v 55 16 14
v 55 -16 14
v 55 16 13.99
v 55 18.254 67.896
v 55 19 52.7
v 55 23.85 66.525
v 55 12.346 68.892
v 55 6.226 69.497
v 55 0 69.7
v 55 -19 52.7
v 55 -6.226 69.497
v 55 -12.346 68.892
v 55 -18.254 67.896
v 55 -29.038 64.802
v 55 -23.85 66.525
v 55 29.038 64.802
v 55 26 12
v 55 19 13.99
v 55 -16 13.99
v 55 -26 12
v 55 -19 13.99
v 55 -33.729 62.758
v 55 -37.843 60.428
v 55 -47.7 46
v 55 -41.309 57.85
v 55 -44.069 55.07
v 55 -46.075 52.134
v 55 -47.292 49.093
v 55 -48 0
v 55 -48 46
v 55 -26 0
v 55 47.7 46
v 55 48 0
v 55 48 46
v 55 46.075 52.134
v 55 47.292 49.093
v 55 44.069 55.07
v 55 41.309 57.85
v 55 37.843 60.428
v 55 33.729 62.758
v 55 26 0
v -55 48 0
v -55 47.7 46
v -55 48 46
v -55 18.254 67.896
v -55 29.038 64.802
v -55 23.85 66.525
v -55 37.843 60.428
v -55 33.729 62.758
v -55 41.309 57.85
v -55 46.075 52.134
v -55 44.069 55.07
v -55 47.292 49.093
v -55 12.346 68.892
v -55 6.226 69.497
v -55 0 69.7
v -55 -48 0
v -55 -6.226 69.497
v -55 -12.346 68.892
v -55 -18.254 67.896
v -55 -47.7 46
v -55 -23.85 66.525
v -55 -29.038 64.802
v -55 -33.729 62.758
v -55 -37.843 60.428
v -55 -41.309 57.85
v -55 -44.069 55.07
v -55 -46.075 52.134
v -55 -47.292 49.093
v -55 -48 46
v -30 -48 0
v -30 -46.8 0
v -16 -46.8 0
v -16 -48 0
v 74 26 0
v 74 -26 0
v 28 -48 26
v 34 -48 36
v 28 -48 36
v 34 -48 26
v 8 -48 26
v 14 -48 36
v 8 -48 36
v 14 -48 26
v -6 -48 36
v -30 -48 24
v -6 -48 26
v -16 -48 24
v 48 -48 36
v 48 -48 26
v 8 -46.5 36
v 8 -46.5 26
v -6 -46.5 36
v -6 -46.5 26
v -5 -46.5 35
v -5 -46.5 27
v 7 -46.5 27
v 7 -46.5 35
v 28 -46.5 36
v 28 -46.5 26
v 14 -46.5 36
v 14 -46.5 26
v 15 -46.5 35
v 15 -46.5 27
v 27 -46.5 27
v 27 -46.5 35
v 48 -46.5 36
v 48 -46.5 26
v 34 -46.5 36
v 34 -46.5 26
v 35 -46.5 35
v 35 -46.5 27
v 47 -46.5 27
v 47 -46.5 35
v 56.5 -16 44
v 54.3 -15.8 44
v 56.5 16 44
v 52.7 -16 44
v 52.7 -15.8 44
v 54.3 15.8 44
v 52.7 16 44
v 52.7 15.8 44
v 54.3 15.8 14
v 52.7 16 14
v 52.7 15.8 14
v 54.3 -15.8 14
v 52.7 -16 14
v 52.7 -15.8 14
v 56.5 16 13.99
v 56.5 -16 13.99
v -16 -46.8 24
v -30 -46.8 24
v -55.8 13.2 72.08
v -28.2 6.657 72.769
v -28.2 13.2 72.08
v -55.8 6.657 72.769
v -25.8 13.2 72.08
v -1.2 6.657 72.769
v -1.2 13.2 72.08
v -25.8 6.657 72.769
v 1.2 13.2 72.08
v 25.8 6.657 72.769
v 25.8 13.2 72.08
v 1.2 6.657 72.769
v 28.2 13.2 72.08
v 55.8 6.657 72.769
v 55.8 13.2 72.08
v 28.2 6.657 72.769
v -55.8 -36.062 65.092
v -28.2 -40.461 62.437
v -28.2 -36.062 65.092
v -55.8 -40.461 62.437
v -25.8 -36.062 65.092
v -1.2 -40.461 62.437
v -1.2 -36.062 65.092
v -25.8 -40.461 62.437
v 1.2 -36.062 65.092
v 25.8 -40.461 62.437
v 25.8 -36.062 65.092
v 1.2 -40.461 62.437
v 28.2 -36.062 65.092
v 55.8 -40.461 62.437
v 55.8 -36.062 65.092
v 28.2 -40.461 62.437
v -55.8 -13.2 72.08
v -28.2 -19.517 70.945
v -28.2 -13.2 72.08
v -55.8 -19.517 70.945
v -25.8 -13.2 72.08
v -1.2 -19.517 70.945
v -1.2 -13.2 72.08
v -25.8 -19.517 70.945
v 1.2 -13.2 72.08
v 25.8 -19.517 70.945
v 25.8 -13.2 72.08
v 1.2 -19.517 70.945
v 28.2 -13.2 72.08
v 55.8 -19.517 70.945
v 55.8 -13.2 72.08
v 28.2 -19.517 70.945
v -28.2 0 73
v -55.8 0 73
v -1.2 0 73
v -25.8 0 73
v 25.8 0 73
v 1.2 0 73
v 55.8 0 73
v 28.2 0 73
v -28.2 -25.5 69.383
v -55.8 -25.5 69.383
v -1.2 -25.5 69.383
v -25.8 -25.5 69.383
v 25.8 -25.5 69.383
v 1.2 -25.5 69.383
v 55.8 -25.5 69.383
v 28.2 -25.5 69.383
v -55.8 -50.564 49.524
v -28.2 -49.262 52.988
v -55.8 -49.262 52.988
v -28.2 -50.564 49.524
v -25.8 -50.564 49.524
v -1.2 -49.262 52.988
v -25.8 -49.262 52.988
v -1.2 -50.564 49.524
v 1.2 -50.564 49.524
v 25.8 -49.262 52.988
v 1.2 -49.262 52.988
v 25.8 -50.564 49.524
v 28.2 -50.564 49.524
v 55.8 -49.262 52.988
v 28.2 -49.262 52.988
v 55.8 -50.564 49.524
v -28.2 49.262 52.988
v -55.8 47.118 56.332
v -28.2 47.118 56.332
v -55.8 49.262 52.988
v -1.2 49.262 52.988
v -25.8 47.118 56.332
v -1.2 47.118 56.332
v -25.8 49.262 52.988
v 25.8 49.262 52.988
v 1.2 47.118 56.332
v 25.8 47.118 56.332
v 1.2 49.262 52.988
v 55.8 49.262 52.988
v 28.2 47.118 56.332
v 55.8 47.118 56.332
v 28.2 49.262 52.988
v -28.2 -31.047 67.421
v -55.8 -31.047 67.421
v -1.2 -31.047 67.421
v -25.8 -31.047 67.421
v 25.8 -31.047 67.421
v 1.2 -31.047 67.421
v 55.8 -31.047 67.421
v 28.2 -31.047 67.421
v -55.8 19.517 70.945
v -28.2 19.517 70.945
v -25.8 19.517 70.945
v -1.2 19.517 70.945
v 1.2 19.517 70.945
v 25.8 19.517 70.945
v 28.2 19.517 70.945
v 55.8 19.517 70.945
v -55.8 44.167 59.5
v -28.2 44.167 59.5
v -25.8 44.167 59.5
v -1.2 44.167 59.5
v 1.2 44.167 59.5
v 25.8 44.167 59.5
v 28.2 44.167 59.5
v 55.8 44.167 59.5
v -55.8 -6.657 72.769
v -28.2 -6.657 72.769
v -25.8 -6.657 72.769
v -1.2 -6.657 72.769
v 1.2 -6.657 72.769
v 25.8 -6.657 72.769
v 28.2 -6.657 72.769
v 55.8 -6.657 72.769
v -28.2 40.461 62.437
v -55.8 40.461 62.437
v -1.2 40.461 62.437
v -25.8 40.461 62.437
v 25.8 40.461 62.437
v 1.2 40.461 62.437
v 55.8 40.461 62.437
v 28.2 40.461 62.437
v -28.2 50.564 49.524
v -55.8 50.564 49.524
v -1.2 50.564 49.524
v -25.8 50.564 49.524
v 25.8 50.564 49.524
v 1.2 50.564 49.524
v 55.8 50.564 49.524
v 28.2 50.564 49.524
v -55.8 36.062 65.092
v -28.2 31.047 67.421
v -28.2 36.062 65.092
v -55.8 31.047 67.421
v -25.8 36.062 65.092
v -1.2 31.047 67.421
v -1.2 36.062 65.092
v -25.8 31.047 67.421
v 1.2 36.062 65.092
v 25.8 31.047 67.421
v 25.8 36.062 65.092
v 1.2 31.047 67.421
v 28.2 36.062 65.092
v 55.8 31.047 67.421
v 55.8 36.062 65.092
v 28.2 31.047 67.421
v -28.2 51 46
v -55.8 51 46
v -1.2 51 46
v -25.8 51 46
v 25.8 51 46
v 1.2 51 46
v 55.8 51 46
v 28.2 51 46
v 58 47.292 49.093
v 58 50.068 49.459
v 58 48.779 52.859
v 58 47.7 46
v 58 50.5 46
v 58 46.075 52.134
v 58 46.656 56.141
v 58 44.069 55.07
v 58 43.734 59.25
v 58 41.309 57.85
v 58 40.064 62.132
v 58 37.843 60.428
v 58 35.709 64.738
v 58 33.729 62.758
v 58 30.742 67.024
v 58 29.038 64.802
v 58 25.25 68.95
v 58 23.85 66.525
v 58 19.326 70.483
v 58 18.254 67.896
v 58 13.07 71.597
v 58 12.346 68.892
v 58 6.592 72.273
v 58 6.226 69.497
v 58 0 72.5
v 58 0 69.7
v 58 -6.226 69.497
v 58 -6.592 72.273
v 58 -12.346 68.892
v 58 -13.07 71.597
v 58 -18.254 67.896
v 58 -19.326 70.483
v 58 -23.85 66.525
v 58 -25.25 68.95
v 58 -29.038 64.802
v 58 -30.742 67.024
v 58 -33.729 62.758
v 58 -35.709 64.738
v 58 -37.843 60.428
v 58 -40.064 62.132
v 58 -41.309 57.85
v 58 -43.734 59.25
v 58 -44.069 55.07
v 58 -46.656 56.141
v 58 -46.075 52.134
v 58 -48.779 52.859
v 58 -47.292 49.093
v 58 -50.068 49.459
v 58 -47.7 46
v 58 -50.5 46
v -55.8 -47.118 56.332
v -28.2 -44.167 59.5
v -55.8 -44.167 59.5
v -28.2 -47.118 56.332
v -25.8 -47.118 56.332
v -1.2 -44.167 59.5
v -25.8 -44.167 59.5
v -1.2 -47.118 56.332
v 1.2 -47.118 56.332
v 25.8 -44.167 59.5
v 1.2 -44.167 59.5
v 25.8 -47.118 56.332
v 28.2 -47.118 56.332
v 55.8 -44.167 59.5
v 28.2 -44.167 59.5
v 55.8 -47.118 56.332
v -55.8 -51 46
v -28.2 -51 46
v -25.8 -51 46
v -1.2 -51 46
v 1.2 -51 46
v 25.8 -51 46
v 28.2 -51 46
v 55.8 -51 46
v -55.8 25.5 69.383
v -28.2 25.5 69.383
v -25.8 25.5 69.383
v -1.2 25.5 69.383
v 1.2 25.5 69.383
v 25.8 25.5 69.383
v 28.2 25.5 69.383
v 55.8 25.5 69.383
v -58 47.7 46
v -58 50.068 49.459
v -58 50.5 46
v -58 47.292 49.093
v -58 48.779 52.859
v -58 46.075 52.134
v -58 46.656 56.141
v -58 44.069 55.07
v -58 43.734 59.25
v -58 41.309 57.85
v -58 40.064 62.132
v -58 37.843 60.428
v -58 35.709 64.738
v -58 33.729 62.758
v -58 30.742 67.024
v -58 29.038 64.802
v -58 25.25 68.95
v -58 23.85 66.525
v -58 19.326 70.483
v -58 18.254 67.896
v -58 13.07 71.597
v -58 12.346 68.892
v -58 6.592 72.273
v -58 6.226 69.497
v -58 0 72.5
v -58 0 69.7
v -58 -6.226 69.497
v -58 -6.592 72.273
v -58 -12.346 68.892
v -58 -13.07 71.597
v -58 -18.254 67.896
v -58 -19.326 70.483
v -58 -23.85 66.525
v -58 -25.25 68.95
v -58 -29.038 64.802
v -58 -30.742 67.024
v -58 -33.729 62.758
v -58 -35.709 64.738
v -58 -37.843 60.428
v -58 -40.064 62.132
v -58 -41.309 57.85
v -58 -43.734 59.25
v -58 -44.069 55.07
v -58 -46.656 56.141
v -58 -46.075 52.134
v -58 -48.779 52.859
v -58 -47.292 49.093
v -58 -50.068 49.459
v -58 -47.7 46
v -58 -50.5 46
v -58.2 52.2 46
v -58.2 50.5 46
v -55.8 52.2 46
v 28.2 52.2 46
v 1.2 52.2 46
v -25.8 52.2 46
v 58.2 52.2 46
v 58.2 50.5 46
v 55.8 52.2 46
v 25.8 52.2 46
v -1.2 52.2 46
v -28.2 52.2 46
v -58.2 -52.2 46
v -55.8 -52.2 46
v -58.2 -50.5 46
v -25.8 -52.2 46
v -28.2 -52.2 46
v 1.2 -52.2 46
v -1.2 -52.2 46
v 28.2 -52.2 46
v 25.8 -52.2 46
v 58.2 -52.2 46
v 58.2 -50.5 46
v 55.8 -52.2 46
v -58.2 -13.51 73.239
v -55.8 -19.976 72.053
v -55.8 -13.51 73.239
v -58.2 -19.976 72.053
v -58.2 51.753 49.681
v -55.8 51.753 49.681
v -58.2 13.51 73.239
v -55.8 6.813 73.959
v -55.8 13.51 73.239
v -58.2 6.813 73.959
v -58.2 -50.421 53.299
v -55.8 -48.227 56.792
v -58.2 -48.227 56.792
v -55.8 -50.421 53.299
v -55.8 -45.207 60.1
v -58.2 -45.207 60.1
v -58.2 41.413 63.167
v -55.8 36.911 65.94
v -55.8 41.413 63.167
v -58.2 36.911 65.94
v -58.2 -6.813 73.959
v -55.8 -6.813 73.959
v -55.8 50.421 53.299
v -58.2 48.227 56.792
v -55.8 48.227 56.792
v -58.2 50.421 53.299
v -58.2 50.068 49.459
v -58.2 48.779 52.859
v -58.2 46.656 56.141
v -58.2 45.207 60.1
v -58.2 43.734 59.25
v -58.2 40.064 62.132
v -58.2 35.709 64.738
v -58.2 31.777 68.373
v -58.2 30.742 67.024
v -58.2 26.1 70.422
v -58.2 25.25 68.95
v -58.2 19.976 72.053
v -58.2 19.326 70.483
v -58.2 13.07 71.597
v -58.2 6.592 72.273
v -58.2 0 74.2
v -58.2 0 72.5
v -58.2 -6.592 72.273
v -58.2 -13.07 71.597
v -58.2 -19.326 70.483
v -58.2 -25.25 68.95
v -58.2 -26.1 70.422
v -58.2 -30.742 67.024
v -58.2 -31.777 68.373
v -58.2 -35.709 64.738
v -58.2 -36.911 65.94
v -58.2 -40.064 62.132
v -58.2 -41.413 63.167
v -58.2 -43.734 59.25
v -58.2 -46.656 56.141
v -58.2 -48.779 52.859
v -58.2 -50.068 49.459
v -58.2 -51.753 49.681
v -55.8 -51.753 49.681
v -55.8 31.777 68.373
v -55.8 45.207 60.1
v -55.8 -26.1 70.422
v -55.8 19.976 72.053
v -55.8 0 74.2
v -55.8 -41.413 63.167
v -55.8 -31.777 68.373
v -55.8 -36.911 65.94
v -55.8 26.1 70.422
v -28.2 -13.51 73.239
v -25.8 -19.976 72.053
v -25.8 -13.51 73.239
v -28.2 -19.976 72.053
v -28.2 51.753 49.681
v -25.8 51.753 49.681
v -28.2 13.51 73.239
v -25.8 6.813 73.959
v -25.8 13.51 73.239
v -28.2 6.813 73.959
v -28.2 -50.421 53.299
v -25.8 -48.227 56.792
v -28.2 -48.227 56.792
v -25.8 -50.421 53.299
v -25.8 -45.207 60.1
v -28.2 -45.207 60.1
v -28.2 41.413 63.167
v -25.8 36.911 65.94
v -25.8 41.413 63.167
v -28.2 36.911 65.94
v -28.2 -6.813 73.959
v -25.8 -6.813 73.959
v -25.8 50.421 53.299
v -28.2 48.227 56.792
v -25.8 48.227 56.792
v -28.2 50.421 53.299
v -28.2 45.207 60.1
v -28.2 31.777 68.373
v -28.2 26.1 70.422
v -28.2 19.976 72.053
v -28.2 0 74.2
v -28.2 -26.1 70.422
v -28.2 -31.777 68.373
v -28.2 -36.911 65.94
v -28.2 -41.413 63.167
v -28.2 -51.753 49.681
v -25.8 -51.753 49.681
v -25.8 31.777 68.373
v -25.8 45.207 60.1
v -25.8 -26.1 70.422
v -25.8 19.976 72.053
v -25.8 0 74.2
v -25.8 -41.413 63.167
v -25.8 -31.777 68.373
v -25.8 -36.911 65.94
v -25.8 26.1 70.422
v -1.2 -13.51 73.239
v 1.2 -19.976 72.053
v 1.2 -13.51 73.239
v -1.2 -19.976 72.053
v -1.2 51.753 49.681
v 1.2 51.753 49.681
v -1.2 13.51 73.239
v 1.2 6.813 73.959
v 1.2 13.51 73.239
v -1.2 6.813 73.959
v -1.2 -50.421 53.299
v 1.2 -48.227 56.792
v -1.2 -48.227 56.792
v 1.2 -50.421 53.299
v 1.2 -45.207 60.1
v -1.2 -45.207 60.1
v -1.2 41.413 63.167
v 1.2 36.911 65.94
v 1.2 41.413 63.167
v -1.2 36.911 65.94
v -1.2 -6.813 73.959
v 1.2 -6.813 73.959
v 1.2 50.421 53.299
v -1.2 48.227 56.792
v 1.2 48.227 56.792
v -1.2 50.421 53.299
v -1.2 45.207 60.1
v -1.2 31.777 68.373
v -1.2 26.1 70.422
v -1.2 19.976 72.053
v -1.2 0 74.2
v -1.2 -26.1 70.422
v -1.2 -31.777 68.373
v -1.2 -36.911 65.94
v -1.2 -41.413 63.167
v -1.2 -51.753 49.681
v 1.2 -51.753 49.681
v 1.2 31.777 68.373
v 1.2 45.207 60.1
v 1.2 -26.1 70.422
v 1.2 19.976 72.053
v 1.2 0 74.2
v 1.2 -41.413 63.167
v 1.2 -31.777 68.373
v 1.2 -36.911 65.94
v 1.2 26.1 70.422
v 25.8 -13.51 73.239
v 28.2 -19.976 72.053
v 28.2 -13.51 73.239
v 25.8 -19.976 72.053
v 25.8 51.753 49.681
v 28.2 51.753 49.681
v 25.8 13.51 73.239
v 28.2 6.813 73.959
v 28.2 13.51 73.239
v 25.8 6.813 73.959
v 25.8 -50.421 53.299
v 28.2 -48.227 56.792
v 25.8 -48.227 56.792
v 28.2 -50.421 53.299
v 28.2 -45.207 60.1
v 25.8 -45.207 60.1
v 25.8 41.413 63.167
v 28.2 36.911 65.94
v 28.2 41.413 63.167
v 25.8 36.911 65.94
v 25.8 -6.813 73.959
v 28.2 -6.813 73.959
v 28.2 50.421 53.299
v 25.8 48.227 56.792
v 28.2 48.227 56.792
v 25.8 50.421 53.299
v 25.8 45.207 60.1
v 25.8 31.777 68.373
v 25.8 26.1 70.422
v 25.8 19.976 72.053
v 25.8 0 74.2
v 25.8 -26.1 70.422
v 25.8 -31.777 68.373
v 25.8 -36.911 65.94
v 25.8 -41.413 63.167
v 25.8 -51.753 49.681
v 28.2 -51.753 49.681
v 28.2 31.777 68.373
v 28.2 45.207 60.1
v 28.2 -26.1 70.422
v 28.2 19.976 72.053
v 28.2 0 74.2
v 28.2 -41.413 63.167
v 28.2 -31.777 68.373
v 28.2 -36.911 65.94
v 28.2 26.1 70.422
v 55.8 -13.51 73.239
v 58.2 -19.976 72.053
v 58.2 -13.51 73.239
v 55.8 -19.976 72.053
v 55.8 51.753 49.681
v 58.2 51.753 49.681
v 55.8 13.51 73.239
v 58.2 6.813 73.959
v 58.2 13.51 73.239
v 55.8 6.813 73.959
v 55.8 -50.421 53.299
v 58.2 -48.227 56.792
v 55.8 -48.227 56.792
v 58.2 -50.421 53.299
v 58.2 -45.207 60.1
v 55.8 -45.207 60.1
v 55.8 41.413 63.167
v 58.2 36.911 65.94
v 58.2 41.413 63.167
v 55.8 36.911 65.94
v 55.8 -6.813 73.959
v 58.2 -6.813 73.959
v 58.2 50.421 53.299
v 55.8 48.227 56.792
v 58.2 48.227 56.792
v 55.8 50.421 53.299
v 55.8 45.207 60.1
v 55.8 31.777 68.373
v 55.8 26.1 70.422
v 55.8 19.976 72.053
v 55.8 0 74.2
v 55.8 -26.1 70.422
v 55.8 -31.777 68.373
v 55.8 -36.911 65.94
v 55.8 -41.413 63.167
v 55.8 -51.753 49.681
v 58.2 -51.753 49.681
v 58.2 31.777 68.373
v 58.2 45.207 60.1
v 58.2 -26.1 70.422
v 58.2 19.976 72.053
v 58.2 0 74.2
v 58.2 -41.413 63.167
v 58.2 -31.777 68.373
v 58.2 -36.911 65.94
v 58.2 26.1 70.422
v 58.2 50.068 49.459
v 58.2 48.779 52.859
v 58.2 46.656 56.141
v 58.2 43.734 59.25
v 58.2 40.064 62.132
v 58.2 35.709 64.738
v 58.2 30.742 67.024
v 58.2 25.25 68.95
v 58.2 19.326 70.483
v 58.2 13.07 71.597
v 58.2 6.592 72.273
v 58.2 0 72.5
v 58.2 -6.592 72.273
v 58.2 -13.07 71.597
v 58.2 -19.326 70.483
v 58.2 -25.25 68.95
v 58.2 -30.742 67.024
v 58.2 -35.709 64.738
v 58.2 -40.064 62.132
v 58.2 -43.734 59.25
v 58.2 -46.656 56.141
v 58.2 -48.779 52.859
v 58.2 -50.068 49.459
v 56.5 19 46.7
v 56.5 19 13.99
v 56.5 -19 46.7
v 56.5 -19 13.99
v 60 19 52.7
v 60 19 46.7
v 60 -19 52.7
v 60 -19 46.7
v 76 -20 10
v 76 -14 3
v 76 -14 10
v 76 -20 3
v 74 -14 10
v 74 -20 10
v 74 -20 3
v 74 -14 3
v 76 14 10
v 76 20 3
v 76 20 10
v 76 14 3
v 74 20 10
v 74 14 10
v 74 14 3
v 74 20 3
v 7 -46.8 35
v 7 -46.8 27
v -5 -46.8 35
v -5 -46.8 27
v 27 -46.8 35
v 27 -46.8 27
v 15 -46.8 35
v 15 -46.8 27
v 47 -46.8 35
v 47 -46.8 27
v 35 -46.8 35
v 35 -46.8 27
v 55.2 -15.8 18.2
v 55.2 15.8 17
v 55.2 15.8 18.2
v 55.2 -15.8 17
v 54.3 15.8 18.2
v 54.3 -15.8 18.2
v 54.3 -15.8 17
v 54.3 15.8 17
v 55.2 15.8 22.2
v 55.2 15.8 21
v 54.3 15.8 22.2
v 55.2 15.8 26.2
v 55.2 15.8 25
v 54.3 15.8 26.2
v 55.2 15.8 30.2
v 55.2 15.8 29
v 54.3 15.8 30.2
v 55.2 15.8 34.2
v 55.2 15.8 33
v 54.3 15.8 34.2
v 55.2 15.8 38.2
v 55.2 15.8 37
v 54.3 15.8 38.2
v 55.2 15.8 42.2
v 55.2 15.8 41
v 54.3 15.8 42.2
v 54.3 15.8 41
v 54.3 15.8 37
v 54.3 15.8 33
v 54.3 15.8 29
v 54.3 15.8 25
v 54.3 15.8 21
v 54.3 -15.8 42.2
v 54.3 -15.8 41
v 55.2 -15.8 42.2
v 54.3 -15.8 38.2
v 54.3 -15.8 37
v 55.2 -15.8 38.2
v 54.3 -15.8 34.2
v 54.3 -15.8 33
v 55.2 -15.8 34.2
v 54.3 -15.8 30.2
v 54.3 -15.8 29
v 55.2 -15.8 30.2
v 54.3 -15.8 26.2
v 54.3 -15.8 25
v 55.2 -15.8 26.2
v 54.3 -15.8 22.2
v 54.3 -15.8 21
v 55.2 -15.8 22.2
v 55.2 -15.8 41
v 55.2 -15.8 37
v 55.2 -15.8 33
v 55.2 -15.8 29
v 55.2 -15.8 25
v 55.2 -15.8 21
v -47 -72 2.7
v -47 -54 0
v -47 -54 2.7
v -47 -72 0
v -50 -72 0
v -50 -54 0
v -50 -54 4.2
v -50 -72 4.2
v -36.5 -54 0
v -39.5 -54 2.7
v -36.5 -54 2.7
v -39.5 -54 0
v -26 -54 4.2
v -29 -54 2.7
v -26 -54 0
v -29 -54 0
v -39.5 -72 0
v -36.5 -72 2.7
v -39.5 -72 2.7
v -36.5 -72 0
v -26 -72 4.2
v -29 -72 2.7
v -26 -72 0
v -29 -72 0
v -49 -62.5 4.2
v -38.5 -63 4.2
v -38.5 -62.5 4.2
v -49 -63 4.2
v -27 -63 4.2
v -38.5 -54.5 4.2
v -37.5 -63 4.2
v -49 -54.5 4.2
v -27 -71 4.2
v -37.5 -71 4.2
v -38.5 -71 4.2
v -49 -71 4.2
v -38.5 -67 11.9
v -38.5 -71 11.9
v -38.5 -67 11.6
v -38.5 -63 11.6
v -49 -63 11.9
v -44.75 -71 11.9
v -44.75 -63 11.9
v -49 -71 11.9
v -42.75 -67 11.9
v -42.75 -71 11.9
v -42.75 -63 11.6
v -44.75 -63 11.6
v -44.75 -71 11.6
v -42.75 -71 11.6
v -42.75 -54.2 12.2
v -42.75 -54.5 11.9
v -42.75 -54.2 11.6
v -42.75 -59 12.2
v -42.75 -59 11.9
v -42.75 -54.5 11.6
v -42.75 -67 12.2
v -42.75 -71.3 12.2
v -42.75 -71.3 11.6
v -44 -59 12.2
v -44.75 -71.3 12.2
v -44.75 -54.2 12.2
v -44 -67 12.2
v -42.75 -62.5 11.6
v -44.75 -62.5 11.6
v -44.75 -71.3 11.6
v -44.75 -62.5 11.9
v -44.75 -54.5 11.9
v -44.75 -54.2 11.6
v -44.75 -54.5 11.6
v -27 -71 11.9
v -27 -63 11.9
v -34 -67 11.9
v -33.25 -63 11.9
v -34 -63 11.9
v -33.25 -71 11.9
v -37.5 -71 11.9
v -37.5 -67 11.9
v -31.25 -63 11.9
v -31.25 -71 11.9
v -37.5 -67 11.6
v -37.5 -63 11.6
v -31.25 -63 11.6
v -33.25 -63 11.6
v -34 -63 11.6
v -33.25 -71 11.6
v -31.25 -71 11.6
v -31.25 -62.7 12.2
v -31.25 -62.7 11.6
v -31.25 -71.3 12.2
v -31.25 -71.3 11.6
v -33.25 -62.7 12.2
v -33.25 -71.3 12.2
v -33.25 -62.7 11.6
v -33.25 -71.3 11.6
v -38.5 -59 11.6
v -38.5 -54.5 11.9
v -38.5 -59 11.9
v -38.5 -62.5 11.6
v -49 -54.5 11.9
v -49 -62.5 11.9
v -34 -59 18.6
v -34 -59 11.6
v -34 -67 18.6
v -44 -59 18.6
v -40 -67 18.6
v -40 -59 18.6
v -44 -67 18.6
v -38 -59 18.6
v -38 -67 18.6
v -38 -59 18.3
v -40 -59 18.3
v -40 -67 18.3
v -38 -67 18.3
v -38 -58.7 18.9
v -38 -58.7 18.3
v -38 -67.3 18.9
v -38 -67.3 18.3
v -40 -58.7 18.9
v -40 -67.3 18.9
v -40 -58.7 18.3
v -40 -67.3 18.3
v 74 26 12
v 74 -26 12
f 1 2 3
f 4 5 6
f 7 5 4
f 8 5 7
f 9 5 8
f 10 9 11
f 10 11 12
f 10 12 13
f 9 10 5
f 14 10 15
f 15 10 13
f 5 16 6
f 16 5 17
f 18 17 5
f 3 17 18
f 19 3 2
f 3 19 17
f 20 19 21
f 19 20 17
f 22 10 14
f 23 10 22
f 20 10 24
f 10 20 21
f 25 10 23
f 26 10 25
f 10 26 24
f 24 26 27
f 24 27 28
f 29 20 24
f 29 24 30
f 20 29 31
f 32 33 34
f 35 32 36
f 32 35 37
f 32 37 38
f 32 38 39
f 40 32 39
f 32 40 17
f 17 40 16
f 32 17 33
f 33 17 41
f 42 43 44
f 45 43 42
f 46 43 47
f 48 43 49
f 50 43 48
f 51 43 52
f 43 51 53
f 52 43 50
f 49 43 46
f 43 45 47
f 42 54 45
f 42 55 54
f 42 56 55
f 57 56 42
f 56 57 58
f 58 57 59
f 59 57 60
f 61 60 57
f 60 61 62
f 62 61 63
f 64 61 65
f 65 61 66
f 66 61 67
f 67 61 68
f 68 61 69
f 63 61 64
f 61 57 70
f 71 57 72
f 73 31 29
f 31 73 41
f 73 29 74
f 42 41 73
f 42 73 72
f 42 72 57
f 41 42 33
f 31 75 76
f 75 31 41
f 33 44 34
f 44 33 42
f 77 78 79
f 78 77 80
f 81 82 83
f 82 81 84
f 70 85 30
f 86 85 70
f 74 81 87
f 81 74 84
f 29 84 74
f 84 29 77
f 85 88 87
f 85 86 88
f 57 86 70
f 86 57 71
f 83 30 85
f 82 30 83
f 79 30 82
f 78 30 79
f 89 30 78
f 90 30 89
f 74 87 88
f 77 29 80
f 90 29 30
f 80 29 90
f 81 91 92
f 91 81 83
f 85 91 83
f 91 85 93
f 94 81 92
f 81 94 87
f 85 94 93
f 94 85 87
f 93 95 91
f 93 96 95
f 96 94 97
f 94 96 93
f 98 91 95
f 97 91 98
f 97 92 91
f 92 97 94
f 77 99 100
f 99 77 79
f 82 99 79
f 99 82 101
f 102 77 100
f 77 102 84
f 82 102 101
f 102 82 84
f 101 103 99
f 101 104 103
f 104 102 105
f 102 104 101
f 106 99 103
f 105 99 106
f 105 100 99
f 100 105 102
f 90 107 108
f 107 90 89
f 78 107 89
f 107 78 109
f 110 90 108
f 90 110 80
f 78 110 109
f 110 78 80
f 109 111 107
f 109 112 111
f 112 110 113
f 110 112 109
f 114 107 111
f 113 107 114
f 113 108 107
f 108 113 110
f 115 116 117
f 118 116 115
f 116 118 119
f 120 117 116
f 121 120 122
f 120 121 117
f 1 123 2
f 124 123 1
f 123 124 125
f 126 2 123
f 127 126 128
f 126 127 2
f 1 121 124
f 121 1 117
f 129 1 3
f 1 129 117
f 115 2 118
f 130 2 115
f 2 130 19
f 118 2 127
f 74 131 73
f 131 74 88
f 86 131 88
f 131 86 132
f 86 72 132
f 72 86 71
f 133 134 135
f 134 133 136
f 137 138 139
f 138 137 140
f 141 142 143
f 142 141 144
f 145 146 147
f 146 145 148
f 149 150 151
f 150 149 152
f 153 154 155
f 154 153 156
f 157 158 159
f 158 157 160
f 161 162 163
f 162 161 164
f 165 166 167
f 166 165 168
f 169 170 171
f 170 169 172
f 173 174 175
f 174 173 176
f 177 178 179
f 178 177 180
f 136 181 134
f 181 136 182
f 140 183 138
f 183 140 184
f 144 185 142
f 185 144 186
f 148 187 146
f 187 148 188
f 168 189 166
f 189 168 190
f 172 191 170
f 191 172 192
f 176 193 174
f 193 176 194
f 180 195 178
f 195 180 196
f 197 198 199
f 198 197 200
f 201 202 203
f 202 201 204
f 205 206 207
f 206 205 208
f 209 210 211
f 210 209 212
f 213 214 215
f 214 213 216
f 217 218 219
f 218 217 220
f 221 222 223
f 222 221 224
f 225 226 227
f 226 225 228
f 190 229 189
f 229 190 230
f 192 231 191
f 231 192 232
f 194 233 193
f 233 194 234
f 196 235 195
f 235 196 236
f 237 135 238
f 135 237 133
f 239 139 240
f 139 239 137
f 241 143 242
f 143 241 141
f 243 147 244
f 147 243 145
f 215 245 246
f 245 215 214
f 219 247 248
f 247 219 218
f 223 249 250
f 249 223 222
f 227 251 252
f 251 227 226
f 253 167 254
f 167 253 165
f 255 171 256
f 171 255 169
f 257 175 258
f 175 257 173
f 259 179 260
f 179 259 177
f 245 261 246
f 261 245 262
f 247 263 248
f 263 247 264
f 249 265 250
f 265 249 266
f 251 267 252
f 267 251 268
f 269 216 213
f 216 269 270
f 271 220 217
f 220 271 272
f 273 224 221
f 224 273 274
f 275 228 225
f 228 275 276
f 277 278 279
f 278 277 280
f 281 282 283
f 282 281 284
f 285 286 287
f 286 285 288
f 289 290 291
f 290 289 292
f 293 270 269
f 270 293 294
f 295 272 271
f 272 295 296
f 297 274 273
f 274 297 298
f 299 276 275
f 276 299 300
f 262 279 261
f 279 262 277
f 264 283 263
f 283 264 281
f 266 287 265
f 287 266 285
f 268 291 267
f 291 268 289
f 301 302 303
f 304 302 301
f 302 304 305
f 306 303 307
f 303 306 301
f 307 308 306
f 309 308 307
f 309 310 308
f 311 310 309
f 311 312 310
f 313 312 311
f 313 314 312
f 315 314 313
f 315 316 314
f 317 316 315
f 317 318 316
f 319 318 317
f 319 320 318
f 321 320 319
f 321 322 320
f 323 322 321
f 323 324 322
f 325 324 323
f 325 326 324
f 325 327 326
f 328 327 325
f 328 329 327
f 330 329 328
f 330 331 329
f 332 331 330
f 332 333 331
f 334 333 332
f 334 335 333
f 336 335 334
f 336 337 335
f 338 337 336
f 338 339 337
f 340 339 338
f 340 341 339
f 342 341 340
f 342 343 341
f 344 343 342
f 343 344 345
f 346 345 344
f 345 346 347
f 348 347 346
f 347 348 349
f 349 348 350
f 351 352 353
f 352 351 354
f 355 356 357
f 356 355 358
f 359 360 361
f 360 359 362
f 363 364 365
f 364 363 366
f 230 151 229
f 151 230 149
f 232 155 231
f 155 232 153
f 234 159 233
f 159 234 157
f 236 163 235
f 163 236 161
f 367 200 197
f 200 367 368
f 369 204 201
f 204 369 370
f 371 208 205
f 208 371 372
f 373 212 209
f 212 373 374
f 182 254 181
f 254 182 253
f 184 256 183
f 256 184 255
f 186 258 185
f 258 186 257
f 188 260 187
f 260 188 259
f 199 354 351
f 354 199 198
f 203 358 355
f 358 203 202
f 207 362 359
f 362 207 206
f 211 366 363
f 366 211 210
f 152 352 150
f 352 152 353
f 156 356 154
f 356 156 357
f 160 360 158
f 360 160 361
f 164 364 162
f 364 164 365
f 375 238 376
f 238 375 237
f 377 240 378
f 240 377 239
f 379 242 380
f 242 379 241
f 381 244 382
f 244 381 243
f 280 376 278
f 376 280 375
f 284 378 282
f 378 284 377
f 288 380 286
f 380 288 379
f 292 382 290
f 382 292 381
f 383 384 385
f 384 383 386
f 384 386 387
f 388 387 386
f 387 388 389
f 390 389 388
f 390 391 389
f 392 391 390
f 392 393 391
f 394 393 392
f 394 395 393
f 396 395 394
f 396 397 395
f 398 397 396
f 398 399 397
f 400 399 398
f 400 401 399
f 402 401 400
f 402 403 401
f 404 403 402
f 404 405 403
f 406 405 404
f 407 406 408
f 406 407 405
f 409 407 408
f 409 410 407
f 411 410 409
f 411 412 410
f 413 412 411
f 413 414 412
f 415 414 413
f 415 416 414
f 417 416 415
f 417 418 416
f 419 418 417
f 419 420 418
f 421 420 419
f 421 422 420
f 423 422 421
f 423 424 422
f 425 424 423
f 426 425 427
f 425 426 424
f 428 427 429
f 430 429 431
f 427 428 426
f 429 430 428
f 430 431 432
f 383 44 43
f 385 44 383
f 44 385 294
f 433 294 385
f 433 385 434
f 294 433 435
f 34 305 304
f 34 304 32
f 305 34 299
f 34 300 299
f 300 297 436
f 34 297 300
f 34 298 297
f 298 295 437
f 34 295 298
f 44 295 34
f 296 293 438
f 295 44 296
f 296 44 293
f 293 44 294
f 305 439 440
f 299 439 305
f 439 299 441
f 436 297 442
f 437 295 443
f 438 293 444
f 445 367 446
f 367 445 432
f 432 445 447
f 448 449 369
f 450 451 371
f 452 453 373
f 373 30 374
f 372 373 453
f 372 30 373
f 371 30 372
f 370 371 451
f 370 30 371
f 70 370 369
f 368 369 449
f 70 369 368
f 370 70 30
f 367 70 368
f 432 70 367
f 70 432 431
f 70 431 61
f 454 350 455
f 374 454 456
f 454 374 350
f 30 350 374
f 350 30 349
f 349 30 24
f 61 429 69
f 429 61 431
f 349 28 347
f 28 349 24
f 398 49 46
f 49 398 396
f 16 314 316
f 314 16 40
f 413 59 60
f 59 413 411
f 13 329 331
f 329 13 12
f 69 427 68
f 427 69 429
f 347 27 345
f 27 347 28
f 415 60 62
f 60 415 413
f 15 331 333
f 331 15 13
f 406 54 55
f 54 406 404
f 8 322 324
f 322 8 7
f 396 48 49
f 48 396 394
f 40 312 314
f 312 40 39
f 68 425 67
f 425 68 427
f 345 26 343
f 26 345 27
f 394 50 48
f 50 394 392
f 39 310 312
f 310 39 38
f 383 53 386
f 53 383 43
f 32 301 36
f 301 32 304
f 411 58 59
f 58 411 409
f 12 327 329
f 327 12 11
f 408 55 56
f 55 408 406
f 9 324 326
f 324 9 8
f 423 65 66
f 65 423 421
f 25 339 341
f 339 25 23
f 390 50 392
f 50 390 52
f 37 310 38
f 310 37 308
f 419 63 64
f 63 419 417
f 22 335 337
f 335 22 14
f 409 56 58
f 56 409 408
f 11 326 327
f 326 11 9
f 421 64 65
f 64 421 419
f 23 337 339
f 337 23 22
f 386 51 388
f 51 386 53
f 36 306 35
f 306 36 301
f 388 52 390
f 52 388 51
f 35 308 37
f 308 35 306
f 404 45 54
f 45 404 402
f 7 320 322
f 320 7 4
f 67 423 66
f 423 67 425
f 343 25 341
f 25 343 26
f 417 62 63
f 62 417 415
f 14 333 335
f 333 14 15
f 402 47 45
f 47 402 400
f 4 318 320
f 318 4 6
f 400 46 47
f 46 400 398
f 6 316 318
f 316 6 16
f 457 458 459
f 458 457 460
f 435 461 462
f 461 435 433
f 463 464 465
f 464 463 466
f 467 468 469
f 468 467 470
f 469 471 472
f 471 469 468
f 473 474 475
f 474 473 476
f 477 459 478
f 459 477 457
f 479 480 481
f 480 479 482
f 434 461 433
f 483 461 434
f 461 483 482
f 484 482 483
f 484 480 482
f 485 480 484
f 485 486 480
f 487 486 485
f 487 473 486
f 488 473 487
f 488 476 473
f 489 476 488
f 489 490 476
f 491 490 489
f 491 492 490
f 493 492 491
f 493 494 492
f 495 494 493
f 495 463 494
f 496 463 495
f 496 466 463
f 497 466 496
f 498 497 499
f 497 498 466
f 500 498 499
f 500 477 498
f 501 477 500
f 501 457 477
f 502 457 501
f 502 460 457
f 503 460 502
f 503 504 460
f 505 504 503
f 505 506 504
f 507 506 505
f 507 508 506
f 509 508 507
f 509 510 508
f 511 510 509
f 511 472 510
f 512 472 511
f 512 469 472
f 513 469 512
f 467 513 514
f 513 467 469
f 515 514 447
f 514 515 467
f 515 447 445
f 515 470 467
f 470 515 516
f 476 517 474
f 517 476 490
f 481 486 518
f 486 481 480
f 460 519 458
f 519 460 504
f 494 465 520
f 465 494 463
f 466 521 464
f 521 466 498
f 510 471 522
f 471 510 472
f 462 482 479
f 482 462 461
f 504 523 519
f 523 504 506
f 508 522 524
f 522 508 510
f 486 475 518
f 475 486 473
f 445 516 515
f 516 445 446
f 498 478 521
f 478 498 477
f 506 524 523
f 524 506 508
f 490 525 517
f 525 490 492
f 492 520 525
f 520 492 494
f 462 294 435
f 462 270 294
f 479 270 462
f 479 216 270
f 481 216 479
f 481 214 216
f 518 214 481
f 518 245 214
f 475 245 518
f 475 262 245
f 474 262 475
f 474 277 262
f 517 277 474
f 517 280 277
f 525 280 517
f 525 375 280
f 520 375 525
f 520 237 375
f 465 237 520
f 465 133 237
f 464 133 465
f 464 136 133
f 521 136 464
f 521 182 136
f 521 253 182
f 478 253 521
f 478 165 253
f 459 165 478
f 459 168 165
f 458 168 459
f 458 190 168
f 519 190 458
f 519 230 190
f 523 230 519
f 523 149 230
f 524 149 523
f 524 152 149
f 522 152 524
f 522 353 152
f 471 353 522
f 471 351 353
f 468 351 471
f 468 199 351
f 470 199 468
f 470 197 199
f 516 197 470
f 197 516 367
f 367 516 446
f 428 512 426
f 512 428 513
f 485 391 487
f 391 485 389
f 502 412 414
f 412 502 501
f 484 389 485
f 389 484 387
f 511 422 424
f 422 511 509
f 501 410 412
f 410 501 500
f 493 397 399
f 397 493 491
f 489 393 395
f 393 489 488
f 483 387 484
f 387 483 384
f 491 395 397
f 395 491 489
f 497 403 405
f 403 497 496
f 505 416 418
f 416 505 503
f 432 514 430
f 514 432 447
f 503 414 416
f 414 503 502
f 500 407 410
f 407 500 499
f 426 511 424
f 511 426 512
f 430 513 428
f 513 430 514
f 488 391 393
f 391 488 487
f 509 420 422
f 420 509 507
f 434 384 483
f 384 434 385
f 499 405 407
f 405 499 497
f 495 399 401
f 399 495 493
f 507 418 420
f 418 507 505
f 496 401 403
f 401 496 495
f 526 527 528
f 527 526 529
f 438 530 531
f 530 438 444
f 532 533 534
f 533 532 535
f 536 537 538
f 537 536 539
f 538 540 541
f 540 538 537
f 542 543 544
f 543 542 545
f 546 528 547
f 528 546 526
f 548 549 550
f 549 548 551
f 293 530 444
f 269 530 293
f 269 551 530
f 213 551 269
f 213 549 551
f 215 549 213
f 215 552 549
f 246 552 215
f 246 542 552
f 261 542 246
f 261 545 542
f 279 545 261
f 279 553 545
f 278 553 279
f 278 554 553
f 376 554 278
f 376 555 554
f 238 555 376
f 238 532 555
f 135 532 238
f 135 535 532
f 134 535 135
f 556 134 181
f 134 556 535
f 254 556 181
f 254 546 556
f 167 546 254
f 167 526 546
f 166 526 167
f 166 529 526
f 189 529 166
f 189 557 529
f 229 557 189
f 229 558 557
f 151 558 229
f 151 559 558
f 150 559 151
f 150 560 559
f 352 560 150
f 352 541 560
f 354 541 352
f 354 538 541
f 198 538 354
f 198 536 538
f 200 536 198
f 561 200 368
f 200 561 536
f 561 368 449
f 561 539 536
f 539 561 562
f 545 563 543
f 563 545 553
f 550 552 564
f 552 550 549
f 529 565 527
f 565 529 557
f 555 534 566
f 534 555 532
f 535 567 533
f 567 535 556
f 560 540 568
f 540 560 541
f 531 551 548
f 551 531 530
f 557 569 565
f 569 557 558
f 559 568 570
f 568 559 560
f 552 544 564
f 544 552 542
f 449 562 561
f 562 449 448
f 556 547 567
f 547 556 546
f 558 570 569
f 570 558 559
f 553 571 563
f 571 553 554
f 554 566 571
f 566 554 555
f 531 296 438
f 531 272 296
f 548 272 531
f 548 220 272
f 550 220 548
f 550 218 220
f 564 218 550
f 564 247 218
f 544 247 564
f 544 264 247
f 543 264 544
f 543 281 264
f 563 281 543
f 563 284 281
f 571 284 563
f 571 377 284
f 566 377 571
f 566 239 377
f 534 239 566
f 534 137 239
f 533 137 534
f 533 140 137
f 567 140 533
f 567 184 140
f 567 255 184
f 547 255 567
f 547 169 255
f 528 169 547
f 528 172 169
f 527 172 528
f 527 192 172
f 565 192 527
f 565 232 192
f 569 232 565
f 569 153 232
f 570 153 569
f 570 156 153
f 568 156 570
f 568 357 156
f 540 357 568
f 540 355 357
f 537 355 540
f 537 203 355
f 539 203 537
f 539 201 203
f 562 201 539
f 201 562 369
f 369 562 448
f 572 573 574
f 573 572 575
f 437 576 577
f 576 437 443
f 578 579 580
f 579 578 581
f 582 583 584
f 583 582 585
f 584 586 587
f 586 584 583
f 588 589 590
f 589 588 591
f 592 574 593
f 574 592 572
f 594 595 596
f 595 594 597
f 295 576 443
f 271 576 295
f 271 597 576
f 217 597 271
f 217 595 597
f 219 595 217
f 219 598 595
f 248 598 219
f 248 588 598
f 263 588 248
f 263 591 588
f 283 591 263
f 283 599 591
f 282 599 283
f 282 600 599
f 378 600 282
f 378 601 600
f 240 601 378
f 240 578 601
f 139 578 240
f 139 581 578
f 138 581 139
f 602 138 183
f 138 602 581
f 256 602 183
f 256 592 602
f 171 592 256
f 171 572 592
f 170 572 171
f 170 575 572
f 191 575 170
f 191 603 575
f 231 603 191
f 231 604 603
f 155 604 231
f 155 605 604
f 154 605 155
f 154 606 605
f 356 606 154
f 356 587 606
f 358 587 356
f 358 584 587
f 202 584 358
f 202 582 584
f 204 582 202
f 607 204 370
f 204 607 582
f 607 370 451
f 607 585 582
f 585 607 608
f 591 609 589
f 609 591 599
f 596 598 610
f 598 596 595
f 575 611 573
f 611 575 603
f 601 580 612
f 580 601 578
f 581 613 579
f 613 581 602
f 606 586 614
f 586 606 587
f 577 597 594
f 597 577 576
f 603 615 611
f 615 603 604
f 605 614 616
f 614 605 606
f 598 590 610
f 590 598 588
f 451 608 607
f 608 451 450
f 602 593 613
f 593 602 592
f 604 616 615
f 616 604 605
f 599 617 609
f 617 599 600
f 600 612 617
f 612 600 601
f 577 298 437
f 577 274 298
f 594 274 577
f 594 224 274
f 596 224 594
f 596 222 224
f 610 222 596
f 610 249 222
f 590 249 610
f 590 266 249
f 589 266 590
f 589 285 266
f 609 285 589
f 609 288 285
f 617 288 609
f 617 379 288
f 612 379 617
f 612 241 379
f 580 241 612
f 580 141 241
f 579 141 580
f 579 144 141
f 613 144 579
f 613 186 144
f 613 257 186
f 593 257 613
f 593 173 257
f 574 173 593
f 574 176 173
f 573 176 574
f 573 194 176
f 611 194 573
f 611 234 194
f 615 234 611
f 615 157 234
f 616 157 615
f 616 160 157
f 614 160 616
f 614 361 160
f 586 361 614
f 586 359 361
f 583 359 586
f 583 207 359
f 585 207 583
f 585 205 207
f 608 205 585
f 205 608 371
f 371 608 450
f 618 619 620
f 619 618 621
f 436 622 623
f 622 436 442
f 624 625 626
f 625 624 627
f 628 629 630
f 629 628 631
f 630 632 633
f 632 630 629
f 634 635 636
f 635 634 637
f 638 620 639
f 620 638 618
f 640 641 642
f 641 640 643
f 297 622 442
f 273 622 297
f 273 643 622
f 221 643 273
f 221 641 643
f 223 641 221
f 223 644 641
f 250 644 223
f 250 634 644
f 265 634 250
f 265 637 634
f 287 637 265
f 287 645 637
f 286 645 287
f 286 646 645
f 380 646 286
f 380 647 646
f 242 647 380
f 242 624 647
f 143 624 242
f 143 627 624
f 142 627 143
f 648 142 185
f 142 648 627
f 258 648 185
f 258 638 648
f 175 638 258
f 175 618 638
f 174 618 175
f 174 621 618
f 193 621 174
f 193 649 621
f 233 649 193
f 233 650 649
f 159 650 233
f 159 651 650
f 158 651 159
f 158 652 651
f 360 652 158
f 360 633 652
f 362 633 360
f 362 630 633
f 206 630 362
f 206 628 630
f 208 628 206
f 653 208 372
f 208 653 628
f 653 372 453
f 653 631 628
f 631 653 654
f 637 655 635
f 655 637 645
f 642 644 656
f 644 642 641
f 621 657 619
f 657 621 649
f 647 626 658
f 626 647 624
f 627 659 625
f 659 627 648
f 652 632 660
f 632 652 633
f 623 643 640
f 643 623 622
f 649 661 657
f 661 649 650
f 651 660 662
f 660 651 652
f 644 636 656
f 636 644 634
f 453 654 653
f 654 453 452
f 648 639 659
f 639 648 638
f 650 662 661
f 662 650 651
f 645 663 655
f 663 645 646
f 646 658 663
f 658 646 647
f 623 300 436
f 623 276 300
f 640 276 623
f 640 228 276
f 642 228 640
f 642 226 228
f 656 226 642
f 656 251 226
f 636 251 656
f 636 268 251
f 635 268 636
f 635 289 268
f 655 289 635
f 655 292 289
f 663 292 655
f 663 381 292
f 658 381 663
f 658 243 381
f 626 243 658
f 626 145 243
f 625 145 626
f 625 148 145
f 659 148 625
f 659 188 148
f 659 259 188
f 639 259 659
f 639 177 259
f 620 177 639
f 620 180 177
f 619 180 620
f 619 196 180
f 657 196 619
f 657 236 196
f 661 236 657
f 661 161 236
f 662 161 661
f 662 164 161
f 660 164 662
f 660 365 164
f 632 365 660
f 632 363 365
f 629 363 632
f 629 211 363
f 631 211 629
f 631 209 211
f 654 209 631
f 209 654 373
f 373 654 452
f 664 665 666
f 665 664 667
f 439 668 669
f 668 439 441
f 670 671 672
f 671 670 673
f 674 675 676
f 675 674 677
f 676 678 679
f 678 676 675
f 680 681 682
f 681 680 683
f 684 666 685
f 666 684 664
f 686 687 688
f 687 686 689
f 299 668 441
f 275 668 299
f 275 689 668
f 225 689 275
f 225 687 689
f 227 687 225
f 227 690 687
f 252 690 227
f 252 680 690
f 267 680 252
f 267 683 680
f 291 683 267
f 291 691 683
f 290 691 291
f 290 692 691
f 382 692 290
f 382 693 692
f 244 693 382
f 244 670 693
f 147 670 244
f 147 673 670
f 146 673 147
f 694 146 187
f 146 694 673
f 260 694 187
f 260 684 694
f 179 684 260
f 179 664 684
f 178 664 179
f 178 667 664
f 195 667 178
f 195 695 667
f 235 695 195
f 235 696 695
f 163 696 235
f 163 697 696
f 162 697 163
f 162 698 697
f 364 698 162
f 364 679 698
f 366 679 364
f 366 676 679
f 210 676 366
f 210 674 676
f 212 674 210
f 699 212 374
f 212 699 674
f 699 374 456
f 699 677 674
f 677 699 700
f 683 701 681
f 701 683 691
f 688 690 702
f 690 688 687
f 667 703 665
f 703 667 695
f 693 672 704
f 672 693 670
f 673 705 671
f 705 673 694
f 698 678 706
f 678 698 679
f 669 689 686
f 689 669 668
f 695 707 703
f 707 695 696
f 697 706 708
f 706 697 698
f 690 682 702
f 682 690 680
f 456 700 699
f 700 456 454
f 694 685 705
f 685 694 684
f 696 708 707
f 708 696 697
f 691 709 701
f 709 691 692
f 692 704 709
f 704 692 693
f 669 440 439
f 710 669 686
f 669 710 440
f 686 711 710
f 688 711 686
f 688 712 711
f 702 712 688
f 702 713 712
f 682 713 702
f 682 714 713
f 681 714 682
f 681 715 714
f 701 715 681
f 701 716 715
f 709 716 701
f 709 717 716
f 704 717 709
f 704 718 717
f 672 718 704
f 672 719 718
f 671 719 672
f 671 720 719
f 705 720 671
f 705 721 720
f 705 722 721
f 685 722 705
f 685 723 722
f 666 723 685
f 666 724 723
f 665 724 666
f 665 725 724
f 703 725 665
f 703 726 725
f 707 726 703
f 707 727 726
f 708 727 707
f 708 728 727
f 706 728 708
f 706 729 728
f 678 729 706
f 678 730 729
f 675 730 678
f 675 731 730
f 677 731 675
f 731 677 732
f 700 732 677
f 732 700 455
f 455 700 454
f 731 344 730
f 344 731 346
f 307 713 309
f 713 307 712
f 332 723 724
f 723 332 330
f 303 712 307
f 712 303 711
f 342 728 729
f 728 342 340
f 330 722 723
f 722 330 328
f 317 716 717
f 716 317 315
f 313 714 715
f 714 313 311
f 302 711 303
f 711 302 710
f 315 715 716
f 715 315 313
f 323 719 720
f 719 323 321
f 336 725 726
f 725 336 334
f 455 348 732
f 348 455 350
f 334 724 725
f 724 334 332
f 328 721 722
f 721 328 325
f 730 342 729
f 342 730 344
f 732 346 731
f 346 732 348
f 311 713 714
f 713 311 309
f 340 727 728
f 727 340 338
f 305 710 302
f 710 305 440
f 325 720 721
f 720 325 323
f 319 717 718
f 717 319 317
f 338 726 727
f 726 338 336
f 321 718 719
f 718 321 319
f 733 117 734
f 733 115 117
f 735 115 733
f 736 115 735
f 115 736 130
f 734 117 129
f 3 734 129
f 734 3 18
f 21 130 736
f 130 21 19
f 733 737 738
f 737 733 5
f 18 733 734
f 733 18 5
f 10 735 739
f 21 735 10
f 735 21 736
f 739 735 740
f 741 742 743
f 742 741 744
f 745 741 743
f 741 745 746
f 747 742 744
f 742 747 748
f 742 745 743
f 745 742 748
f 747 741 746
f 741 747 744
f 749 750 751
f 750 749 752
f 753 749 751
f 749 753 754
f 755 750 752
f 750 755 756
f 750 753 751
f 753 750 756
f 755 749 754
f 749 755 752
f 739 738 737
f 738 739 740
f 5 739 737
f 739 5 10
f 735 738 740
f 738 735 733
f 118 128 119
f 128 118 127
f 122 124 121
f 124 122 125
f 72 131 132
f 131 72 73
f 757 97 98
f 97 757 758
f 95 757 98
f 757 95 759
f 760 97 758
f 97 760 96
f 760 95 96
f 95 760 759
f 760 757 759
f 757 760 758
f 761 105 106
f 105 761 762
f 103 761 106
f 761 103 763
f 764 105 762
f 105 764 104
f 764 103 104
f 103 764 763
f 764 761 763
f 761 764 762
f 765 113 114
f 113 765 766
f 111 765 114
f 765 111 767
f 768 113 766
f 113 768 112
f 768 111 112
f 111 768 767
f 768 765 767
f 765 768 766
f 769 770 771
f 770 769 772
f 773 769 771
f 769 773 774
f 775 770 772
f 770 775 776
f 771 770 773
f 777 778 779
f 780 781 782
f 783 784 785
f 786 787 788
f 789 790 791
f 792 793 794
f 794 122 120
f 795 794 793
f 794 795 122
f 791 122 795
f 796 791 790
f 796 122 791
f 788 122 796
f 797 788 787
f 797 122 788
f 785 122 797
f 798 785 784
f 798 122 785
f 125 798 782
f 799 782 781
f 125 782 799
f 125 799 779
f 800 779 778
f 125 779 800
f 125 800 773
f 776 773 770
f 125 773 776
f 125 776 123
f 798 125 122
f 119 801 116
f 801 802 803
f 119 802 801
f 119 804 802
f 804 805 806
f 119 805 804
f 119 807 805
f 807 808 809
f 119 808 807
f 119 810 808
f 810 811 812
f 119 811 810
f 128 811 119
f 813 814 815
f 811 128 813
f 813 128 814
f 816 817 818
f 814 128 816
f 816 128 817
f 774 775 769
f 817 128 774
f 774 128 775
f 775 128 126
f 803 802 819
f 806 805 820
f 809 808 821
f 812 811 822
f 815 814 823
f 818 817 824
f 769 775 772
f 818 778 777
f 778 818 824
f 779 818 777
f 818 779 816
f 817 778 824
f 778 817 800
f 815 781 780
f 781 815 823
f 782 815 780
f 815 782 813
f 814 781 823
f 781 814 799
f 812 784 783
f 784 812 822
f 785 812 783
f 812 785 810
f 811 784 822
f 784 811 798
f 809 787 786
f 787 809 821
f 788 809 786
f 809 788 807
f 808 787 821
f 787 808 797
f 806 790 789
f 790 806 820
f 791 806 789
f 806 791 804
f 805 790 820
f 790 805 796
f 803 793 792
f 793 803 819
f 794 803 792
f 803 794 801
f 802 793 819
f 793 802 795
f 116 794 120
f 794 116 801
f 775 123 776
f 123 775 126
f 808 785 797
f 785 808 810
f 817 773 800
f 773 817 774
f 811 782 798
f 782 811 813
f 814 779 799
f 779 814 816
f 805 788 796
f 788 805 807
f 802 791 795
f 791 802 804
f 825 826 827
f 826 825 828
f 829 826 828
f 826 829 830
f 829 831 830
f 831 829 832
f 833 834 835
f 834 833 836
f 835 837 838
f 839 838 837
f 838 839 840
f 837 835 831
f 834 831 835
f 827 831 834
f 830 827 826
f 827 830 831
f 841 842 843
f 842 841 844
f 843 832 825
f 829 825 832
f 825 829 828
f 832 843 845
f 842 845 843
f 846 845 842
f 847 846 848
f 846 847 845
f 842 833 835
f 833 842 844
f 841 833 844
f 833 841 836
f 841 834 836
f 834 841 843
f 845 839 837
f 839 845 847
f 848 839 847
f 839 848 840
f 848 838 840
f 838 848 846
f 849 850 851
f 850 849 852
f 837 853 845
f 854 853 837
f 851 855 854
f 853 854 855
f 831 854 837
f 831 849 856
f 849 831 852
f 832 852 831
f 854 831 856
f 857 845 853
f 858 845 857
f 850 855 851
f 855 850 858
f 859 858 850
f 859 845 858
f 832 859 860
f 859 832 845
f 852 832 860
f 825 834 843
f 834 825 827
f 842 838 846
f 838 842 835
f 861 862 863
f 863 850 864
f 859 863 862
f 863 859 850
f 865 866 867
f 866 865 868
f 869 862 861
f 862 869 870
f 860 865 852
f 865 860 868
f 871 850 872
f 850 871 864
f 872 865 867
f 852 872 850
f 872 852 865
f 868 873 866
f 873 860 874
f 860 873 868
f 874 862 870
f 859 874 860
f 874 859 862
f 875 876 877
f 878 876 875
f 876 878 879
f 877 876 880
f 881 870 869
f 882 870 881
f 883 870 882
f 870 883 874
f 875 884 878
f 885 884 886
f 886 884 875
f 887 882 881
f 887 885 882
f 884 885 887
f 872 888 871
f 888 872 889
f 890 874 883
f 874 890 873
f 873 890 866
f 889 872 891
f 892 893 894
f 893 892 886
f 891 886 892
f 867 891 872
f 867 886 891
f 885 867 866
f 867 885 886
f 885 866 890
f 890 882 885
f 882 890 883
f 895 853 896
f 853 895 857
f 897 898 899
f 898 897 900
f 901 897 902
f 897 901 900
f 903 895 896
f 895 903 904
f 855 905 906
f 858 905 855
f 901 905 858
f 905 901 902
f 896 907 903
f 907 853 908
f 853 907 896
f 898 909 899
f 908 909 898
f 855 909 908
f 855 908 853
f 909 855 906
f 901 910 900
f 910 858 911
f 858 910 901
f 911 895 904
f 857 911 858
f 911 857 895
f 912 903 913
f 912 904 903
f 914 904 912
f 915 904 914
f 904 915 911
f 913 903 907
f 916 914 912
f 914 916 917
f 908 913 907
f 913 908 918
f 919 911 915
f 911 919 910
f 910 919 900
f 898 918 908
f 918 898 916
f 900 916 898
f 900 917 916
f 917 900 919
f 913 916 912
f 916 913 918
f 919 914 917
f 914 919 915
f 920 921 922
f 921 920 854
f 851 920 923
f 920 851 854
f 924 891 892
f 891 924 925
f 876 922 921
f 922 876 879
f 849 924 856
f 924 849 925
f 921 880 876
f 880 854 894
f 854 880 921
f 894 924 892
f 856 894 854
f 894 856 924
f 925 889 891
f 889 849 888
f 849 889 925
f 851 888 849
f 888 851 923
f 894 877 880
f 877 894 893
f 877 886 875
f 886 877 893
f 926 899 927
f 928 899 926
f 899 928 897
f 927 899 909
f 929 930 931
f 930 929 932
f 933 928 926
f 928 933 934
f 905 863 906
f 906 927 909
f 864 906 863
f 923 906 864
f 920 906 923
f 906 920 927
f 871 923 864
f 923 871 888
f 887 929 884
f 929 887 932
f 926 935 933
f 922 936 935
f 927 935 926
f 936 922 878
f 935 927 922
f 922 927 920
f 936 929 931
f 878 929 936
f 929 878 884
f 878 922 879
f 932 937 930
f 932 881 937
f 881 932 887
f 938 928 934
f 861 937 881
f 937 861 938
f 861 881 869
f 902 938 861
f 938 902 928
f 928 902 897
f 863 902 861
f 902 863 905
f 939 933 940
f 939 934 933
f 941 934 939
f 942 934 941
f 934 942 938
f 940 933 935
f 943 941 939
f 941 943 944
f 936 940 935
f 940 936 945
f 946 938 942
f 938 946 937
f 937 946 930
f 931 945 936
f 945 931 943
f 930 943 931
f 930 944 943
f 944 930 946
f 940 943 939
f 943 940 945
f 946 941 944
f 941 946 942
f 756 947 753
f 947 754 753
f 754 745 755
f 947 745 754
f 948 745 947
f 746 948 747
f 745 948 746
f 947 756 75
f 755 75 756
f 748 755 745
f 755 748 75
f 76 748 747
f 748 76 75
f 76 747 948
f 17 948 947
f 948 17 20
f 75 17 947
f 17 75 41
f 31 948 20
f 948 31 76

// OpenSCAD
// Kiuê — Produtor como doca de expedição (galpão), v1 às cegas.
// Substitui a máquina com prensa: o galpão despacha caixas pelo portão de enrolar da direita.
// Escala: 1 unidade do jogo = 100 mm, antes do NODE_SCALE (1,3) que o jogo aplica.
// Convenções: Z para cima; frente em −Y (no jogo vira +z, voltada para a câmera);
// origem no centro, no topo do pedestal (pedestal 160 × 150 fica no jogo).
// Saída pela direita (+X): portão centrado na altura da conexão (30 mm); a doca vai até x = 76
// (a conexão começa em x = 80).
// Partes:
//   corpo    paredes (cor da peça, cinza-claro)
//   telhado  casca em arco com nervuras (grafite)
//   detalhe  escuro: moldura e caixa do portão, para-choques, porta da frente
//   doca     plataforma de carga (concreto)
//   janelas  vidros acesos da frente
//   portao   porta de enrolar; origem no topo da abertura, descendo em −Z
//            (o jogo encolhe a altura para "enrolar" a cada mensagem enviada)
//   palete   madeira
//   caixas   papelão

parte = "tudo";
PARTES = ["corpo", "telhado", "detalhe", "doca", "janelas", "portao", "palete", "caixas"];

W = 110; D = 96; WALL_H = 46;
RISE = 24;                         // flecha do arco das paredes das pontas
ROOF_T = 3;                        // espessura e beiral do telhado
DOOR_W = 32; DOOR_Z0 = 14; DOOR_Z1 = 46 - 2; // abertura do portão (z 14 a 44: centro 29)
DOOR_IN = 3;                       // portão recuado na parede
DOCK_X1 = 74; DOCK_H = 12; DOCK_D = 52;
$fn = 48;

// arco das pontas: meio cilindro achatado ao longo de X, só a parte acima de WALL_H
module arco(r, rise, len) {
    intersection() {
        translate([0, 0, WALL_H]) scale([1, 1, rise / r]) rotate([0, 90, 0]) cylinder(r = r, h = len, center = true);
        translate([-len, -2 * r, WALL_H]) cube([2 * len, 4 * r, 2 * r]);
    }
}

module corpo() {
    difference() {
        union() {
            translate([-W / 2, -D / 2, 0]) cube([W, D, WALL_H]);
            arco(D / 2, RISE, W);
        }
        // abertura do portão (lado direito)
        translate([W / 2 - DOOR_IN, -DOOR_W / 2, DOOR_Z0]) cube([DOOR_IN + 1, DOOR_W, DOOR_Z1 - DOOR_Z0]);
        // porta e janelas da frente, rebaixadas
        translate([-30, -D / 2 - 1, -1]) cube([14, 2.5, 25]);
        for (x = [-6, 14, 34]) translate([x, -D / 2 - 1, 26]) cube([14, 2.5, 10]);
    }
}

module telhado() {
    difference() {
        arco(D / 2 + ROOF_T, RISE + ROOF_T, W + 2 * ROOF_T);
        arco(D / 2 - 0.3, RISE - 0.3, W + 2 * ROOF_T + 2);
    }
    // nervuras: dão a leitura de telha metálica curva
    for (x = [-W / 2 - ROOF_T + 1, -27, 0, 27, W / 2 + ROOF_T - 1])
        translate([x, 0, 0]) difference() {
            arco(D / 2 + ROOF_T + 1.2, RISE + ROOF_T + 1.2, 2.4);
            arco(D / 2 + ROOF_T - 0.5, RISE + ROOF_T - 0.5, 4);
        }
}

module detalhe() {
    // moldura do portão, saliente 1,5
    translate([W / 2 - 0.3, 0, 0]) difference() {
        translate([0, -DOOR_W / 2 - 3, DOOR_Z0 - 0.01]) cube([1.8, DOOR_W + 6, DOOR_Z1 - DOOR_Z0 + 3]);
        translate([-1, -DOOR_W / 2, DOOR_Z0 - 1]) cube([4, DOOR_W, DOOR_Z1 - DOOR_Z0 + 1]);
    }
    // caixa do rolo do portão, acima da abertura
    translate([W / 2 - 0.3, -DOOR_W / 2 - 3, DOOR_Z1 + 2.7]) cube([5.3, DOOR_W + 6, 6]);
    // fundo escuro atrás do portão (encosta no fundo do recorte)
    translate([W / 2 - DOOR_IN - 0.3, -DOOR_W / 2 - 0.3, DOOR_Z0 - 0.3]) cube([1, DOOR_W + 0.6, DOOR_Z1 - DOOR_Z0 + 0.6]);
    // para-choques da doca
    for (y = [-17, 17]) translate([DOCK_X1 - 0.3, y - 3, 3]) cube([2.3, 6, 7]);
    // porta da frente (no fundo do rebaixo)
    translate([-30, -D / 2 + 1.2, 0]) cube([14, 0.6, 24.3]);
}

module doca() {
    // plataforma encostada na parede (sobreposição 0,3)
    translate([W / 2 - 0.3, -DOCK_D / 2, 0]) cube([DOCK_X1 - W / 2 + 0.3, DOCK_D, DOCK_H]);
}

module janelas() {
    for (x = [-6, 14, 34]) translate([x + 1, -D / 2 + 1.2, 27]) cube([12, 0.6, 8]);
}

module portao() {
    // chapa de 2 mm com frisos horizontais; origem no topo da abertura
    translate([-1, -DOOR_W / 2 + 0.2, -(DOOR_Z1 - DOOR_Z0)]) cube([2, DOOR_W - 0.4, DOOR_Z1 - DOOR_Z0]);
    for (z = [-(DOOR_Z1 - DOOR_Z0) + 3 : 4 : -2]) translate([0.7, -DOOR_W / 2 + 0.2, z]) cube([1.2, DOOR_W - 0.4, 1.2]);
}

module palete() {
    // palete na frente, à esquerda da porta: tábuas em cima de três calços
    translate([-50, -D / 2 - 24, 0]) {
        for (x = [0, 10.5, 21]) translate([x, 0, 0]) cube([3, 18, 3]);
        translate([0, 0, 2.7]) cube([24, 18, 1.5]);
    }
}

module caixas() {
    // três caixas no palete e uma em cima, com a fita do lacre em relevo
    translate([-50, -D / 2 - 24, 3.9]) {
        for (p = [[1, 1], [12.5, 1], [1, 9.5]]) translate([p[0], p[1], 0]) caixa(10.5, 8, 8);
        translate([6, 5, 7.7]) caixa(10, 8, 7);
    }
}

module caixa(w, d, h) {
    cube([w, d, h]);
    translate([w / 2 - 1, -0.3, h - 0.3]) cube([2, d + 0.6, 0.6]);
}

module peca(n) {
    if (n == "corpo") corpo();
    else if (n == "telhado") telhado();
    else if (n == "detalhe") detalhe();
    else if (n == "doca") doca();
    else if (n == "janelas") janelas();
    else if (n == "portao") translate([W / 2 - DOOR_IN + 1.3, 0, DOOR_Z1]) portao();
    else if (n == "palete") palete();
    else if (n == "caixas") caixas();
}

exporta = false;
if (parte == "tudo") union() for (p = PARTES) peca(p);
else if (exporta && parte == "portao") portao();
else peca(parte);
